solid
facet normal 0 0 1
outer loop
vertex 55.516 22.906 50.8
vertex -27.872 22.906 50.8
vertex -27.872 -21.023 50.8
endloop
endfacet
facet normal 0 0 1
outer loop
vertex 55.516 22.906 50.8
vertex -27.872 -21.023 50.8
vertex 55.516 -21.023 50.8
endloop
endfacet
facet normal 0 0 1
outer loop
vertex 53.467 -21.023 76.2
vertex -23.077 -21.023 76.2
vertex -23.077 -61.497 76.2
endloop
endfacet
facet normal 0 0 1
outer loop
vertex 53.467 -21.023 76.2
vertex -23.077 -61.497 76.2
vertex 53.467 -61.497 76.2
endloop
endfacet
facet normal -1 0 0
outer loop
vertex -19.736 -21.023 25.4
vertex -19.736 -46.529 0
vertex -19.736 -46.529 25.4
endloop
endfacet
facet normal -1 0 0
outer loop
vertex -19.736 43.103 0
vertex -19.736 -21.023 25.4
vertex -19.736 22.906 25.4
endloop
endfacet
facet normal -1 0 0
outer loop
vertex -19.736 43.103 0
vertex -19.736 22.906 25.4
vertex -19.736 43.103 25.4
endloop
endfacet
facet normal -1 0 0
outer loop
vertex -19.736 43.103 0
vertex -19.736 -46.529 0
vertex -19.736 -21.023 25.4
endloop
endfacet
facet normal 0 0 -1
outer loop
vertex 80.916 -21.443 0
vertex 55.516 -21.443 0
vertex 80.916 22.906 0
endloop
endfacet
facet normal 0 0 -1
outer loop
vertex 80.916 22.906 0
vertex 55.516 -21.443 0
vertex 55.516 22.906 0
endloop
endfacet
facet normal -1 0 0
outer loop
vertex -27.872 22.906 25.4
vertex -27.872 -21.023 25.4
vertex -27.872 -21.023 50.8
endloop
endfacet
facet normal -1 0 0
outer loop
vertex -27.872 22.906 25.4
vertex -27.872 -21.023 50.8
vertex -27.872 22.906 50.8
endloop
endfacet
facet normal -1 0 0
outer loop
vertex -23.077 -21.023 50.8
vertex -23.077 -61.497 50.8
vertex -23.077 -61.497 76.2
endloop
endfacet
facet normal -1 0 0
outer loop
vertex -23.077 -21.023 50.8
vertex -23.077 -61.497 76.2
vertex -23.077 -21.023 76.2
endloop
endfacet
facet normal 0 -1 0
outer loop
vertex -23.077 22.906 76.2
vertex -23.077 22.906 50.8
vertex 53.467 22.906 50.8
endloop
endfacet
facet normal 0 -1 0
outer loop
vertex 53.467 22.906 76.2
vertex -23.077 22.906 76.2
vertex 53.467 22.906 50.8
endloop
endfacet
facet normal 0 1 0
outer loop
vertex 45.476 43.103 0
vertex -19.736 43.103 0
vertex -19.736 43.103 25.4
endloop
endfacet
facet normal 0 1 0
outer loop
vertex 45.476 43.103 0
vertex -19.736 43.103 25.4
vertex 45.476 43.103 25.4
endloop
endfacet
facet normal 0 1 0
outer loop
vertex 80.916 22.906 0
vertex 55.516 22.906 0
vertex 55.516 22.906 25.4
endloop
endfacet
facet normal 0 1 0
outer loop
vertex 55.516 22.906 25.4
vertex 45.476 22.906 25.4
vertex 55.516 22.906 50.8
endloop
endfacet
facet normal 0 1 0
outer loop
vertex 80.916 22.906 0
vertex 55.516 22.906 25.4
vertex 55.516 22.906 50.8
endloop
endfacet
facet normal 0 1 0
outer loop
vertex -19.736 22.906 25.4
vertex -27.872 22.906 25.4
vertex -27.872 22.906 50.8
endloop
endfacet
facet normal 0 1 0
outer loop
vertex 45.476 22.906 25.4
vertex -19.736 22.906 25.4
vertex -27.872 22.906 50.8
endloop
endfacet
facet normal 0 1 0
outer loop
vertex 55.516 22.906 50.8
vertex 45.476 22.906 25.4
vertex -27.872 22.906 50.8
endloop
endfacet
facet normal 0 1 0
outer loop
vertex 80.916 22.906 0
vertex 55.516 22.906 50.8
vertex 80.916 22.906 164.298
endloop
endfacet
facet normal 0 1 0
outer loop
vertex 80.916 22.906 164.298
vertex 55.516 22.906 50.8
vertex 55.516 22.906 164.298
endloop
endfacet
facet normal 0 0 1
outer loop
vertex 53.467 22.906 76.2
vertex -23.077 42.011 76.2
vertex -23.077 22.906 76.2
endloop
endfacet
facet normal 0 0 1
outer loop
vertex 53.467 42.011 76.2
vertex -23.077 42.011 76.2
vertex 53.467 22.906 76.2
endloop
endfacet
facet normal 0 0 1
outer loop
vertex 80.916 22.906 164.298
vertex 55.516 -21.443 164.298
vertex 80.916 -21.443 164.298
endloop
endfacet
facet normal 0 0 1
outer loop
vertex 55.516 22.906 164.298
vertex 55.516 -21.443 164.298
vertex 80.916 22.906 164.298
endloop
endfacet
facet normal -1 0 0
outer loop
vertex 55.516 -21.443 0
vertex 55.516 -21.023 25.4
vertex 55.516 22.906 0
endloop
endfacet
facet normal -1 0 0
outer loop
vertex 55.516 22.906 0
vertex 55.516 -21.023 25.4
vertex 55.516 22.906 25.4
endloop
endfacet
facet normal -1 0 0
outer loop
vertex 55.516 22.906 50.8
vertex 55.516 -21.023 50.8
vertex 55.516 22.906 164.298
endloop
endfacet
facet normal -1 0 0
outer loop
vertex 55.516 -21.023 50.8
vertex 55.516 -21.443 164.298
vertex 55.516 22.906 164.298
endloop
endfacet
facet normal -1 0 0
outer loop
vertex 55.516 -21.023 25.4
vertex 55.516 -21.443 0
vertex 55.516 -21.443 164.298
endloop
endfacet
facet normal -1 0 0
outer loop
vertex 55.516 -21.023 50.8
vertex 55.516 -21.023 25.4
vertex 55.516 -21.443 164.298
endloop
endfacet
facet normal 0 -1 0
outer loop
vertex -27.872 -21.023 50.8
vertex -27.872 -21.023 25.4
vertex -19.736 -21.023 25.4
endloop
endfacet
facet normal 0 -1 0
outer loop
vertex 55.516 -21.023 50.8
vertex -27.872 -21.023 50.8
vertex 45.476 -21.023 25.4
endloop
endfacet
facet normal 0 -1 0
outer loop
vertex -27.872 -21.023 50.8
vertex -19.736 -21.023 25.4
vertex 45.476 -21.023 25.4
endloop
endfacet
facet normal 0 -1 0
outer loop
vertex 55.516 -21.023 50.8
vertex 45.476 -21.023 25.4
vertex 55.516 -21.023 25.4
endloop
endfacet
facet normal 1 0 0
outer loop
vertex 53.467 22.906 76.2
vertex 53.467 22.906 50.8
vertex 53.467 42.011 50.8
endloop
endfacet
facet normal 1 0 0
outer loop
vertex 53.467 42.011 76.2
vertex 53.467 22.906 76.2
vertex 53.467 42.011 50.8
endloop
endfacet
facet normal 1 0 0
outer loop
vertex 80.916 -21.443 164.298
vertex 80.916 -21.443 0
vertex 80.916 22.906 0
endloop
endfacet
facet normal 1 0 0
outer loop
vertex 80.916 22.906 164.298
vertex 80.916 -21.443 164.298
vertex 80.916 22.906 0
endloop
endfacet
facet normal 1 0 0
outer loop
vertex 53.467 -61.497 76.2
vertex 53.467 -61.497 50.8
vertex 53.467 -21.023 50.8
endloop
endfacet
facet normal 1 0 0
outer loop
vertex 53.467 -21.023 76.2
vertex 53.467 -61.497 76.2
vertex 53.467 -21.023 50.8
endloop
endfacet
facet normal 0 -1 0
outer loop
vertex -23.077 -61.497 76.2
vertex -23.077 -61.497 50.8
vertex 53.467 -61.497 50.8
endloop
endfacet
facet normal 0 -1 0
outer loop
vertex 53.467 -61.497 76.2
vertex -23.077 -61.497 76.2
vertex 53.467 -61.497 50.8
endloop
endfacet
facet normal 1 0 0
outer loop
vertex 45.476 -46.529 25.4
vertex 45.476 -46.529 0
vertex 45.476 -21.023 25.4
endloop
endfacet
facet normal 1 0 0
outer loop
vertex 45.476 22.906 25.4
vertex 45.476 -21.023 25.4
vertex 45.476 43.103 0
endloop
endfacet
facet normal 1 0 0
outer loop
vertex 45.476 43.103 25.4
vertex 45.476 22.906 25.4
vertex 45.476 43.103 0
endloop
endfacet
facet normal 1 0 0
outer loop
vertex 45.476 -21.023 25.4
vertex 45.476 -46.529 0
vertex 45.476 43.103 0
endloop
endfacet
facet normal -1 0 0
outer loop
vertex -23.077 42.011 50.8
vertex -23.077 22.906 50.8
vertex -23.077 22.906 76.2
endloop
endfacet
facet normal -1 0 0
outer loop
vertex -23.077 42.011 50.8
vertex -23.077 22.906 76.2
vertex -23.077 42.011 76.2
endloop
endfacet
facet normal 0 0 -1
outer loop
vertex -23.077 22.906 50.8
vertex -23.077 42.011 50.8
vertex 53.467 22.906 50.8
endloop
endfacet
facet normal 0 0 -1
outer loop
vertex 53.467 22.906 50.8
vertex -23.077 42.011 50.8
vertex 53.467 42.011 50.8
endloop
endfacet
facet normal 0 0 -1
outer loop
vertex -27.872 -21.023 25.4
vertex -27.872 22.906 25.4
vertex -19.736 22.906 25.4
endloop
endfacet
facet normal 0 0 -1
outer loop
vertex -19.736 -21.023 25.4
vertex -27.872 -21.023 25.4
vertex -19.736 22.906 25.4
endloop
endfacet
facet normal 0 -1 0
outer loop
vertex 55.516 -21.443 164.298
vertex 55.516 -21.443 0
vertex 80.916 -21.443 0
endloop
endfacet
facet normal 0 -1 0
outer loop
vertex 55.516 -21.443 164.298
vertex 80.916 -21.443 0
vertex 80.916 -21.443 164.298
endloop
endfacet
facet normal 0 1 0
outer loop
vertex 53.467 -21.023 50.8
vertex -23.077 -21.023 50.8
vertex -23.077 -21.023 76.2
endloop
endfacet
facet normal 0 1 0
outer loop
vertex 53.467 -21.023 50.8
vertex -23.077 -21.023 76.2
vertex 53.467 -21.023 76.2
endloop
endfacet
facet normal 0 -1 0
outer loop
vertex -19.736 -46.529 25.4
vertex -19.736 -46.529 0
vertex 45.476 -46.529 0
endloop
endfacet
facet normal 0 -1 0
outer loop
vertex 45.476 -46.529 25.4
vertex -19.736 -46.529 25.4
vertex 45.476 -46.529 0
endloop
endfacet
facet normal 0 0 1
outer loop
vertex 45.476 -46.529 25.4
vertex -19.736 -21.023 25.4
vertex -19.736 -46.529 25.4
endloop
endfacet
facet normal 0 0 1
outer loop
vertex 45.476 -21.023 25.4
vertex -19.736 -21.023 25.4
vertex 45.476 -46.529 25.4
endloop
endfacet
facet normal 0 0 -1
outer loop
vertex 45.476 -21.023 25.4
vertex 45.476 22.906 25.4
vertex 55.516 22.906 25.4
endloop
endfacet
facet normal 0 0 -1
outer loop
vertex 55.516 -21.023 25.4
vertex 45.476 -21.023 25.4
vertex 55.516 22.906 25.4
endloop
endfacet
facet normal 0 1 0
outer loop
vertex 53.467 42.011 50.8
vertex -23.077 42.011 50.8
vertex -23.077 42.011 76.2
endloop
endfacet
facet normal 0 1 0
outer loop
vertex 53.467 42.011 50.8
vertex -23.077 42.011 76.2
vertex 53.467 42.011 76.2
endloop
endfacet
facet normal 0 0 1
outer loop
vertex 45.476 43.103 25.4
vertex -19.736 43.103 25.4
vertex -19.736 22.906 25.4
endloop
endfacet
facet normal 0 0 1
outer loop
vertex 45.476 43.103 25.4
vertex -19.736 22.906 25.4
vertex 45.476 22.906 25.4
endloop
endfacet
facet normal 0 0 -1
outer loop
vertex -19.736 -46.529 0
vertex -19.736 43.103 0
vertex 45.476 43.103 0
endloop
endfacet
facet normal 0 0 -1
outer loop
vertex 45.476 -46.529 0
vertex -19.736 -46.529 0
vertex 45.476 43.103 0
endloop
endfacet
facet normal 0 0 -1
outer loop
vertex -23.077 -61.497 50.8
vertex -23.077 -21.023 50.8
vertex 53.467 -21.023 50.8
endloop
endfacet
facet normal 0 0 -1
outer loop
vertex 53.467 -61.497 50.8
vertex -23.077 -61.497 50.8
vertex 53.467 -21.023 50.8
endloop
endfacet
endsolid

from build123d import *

# Parameters (mm, degrees)
F0_W     = 65.211655
F0_H     = 89.632485
F1_DEPTH = 25.4
F2_W     = 83.387902
F2_H     = 43.929244
F2_W_2   = 8.13628
F3_DEPTH = 25.4
F4_W     = 76.544497
F4_H     = 19.105036
F4_H_2   = 40.473608
F5_DEPTH = 25.4
F6_W     = 44.349514
F6_H     = 164.298385
F7_DEPTH = 25.4


with BuildPart() as f1:
    # F0 (on Top) → F1 (new body)
    with BuildSketch(Plane.XY):
        with Locations((12.869878, -1.71314)):
            Rectangle(F0_W, F0_H)
    extrude(amount=F1_DEPTH)

    # F2 (on face) → F3 (join)
    with BuildSketch(Plane.XY.offset(25.4)):
        with Locations((13.821722, 0.941525)):
            Rectangle(F2_W, F2_H)
        with Locations((-23.804089, 0.941525)):
            Rectangle(F2_W_2, F2_H)
    extrude(amount=F3_DEPTH)

    # F6 (on face) → F7 (join)
    with BuildSketch(Plane.YZ.offset(55.515673)):
        with Locations((0.73139, 82.149192)):
            Rectangle(F6_W, F6_H)
    extrude(amount=F7_DEPTH)


with BuildPart() as f5:
    # F4 (on face) → F5 (new body)
    with BuildSketch(Plane.XY.offset(50.8)):
        with Locations((15.194813, 32.458665)):
            Rectangle(F4_W, F4_H)
        with Locations((15.194813, -41.259901)):
            Rectangle(F4_W, F4_H_2)
    extrude(amount=F5_DEPTH)


solid = Compound([f1.part, f5.part])
